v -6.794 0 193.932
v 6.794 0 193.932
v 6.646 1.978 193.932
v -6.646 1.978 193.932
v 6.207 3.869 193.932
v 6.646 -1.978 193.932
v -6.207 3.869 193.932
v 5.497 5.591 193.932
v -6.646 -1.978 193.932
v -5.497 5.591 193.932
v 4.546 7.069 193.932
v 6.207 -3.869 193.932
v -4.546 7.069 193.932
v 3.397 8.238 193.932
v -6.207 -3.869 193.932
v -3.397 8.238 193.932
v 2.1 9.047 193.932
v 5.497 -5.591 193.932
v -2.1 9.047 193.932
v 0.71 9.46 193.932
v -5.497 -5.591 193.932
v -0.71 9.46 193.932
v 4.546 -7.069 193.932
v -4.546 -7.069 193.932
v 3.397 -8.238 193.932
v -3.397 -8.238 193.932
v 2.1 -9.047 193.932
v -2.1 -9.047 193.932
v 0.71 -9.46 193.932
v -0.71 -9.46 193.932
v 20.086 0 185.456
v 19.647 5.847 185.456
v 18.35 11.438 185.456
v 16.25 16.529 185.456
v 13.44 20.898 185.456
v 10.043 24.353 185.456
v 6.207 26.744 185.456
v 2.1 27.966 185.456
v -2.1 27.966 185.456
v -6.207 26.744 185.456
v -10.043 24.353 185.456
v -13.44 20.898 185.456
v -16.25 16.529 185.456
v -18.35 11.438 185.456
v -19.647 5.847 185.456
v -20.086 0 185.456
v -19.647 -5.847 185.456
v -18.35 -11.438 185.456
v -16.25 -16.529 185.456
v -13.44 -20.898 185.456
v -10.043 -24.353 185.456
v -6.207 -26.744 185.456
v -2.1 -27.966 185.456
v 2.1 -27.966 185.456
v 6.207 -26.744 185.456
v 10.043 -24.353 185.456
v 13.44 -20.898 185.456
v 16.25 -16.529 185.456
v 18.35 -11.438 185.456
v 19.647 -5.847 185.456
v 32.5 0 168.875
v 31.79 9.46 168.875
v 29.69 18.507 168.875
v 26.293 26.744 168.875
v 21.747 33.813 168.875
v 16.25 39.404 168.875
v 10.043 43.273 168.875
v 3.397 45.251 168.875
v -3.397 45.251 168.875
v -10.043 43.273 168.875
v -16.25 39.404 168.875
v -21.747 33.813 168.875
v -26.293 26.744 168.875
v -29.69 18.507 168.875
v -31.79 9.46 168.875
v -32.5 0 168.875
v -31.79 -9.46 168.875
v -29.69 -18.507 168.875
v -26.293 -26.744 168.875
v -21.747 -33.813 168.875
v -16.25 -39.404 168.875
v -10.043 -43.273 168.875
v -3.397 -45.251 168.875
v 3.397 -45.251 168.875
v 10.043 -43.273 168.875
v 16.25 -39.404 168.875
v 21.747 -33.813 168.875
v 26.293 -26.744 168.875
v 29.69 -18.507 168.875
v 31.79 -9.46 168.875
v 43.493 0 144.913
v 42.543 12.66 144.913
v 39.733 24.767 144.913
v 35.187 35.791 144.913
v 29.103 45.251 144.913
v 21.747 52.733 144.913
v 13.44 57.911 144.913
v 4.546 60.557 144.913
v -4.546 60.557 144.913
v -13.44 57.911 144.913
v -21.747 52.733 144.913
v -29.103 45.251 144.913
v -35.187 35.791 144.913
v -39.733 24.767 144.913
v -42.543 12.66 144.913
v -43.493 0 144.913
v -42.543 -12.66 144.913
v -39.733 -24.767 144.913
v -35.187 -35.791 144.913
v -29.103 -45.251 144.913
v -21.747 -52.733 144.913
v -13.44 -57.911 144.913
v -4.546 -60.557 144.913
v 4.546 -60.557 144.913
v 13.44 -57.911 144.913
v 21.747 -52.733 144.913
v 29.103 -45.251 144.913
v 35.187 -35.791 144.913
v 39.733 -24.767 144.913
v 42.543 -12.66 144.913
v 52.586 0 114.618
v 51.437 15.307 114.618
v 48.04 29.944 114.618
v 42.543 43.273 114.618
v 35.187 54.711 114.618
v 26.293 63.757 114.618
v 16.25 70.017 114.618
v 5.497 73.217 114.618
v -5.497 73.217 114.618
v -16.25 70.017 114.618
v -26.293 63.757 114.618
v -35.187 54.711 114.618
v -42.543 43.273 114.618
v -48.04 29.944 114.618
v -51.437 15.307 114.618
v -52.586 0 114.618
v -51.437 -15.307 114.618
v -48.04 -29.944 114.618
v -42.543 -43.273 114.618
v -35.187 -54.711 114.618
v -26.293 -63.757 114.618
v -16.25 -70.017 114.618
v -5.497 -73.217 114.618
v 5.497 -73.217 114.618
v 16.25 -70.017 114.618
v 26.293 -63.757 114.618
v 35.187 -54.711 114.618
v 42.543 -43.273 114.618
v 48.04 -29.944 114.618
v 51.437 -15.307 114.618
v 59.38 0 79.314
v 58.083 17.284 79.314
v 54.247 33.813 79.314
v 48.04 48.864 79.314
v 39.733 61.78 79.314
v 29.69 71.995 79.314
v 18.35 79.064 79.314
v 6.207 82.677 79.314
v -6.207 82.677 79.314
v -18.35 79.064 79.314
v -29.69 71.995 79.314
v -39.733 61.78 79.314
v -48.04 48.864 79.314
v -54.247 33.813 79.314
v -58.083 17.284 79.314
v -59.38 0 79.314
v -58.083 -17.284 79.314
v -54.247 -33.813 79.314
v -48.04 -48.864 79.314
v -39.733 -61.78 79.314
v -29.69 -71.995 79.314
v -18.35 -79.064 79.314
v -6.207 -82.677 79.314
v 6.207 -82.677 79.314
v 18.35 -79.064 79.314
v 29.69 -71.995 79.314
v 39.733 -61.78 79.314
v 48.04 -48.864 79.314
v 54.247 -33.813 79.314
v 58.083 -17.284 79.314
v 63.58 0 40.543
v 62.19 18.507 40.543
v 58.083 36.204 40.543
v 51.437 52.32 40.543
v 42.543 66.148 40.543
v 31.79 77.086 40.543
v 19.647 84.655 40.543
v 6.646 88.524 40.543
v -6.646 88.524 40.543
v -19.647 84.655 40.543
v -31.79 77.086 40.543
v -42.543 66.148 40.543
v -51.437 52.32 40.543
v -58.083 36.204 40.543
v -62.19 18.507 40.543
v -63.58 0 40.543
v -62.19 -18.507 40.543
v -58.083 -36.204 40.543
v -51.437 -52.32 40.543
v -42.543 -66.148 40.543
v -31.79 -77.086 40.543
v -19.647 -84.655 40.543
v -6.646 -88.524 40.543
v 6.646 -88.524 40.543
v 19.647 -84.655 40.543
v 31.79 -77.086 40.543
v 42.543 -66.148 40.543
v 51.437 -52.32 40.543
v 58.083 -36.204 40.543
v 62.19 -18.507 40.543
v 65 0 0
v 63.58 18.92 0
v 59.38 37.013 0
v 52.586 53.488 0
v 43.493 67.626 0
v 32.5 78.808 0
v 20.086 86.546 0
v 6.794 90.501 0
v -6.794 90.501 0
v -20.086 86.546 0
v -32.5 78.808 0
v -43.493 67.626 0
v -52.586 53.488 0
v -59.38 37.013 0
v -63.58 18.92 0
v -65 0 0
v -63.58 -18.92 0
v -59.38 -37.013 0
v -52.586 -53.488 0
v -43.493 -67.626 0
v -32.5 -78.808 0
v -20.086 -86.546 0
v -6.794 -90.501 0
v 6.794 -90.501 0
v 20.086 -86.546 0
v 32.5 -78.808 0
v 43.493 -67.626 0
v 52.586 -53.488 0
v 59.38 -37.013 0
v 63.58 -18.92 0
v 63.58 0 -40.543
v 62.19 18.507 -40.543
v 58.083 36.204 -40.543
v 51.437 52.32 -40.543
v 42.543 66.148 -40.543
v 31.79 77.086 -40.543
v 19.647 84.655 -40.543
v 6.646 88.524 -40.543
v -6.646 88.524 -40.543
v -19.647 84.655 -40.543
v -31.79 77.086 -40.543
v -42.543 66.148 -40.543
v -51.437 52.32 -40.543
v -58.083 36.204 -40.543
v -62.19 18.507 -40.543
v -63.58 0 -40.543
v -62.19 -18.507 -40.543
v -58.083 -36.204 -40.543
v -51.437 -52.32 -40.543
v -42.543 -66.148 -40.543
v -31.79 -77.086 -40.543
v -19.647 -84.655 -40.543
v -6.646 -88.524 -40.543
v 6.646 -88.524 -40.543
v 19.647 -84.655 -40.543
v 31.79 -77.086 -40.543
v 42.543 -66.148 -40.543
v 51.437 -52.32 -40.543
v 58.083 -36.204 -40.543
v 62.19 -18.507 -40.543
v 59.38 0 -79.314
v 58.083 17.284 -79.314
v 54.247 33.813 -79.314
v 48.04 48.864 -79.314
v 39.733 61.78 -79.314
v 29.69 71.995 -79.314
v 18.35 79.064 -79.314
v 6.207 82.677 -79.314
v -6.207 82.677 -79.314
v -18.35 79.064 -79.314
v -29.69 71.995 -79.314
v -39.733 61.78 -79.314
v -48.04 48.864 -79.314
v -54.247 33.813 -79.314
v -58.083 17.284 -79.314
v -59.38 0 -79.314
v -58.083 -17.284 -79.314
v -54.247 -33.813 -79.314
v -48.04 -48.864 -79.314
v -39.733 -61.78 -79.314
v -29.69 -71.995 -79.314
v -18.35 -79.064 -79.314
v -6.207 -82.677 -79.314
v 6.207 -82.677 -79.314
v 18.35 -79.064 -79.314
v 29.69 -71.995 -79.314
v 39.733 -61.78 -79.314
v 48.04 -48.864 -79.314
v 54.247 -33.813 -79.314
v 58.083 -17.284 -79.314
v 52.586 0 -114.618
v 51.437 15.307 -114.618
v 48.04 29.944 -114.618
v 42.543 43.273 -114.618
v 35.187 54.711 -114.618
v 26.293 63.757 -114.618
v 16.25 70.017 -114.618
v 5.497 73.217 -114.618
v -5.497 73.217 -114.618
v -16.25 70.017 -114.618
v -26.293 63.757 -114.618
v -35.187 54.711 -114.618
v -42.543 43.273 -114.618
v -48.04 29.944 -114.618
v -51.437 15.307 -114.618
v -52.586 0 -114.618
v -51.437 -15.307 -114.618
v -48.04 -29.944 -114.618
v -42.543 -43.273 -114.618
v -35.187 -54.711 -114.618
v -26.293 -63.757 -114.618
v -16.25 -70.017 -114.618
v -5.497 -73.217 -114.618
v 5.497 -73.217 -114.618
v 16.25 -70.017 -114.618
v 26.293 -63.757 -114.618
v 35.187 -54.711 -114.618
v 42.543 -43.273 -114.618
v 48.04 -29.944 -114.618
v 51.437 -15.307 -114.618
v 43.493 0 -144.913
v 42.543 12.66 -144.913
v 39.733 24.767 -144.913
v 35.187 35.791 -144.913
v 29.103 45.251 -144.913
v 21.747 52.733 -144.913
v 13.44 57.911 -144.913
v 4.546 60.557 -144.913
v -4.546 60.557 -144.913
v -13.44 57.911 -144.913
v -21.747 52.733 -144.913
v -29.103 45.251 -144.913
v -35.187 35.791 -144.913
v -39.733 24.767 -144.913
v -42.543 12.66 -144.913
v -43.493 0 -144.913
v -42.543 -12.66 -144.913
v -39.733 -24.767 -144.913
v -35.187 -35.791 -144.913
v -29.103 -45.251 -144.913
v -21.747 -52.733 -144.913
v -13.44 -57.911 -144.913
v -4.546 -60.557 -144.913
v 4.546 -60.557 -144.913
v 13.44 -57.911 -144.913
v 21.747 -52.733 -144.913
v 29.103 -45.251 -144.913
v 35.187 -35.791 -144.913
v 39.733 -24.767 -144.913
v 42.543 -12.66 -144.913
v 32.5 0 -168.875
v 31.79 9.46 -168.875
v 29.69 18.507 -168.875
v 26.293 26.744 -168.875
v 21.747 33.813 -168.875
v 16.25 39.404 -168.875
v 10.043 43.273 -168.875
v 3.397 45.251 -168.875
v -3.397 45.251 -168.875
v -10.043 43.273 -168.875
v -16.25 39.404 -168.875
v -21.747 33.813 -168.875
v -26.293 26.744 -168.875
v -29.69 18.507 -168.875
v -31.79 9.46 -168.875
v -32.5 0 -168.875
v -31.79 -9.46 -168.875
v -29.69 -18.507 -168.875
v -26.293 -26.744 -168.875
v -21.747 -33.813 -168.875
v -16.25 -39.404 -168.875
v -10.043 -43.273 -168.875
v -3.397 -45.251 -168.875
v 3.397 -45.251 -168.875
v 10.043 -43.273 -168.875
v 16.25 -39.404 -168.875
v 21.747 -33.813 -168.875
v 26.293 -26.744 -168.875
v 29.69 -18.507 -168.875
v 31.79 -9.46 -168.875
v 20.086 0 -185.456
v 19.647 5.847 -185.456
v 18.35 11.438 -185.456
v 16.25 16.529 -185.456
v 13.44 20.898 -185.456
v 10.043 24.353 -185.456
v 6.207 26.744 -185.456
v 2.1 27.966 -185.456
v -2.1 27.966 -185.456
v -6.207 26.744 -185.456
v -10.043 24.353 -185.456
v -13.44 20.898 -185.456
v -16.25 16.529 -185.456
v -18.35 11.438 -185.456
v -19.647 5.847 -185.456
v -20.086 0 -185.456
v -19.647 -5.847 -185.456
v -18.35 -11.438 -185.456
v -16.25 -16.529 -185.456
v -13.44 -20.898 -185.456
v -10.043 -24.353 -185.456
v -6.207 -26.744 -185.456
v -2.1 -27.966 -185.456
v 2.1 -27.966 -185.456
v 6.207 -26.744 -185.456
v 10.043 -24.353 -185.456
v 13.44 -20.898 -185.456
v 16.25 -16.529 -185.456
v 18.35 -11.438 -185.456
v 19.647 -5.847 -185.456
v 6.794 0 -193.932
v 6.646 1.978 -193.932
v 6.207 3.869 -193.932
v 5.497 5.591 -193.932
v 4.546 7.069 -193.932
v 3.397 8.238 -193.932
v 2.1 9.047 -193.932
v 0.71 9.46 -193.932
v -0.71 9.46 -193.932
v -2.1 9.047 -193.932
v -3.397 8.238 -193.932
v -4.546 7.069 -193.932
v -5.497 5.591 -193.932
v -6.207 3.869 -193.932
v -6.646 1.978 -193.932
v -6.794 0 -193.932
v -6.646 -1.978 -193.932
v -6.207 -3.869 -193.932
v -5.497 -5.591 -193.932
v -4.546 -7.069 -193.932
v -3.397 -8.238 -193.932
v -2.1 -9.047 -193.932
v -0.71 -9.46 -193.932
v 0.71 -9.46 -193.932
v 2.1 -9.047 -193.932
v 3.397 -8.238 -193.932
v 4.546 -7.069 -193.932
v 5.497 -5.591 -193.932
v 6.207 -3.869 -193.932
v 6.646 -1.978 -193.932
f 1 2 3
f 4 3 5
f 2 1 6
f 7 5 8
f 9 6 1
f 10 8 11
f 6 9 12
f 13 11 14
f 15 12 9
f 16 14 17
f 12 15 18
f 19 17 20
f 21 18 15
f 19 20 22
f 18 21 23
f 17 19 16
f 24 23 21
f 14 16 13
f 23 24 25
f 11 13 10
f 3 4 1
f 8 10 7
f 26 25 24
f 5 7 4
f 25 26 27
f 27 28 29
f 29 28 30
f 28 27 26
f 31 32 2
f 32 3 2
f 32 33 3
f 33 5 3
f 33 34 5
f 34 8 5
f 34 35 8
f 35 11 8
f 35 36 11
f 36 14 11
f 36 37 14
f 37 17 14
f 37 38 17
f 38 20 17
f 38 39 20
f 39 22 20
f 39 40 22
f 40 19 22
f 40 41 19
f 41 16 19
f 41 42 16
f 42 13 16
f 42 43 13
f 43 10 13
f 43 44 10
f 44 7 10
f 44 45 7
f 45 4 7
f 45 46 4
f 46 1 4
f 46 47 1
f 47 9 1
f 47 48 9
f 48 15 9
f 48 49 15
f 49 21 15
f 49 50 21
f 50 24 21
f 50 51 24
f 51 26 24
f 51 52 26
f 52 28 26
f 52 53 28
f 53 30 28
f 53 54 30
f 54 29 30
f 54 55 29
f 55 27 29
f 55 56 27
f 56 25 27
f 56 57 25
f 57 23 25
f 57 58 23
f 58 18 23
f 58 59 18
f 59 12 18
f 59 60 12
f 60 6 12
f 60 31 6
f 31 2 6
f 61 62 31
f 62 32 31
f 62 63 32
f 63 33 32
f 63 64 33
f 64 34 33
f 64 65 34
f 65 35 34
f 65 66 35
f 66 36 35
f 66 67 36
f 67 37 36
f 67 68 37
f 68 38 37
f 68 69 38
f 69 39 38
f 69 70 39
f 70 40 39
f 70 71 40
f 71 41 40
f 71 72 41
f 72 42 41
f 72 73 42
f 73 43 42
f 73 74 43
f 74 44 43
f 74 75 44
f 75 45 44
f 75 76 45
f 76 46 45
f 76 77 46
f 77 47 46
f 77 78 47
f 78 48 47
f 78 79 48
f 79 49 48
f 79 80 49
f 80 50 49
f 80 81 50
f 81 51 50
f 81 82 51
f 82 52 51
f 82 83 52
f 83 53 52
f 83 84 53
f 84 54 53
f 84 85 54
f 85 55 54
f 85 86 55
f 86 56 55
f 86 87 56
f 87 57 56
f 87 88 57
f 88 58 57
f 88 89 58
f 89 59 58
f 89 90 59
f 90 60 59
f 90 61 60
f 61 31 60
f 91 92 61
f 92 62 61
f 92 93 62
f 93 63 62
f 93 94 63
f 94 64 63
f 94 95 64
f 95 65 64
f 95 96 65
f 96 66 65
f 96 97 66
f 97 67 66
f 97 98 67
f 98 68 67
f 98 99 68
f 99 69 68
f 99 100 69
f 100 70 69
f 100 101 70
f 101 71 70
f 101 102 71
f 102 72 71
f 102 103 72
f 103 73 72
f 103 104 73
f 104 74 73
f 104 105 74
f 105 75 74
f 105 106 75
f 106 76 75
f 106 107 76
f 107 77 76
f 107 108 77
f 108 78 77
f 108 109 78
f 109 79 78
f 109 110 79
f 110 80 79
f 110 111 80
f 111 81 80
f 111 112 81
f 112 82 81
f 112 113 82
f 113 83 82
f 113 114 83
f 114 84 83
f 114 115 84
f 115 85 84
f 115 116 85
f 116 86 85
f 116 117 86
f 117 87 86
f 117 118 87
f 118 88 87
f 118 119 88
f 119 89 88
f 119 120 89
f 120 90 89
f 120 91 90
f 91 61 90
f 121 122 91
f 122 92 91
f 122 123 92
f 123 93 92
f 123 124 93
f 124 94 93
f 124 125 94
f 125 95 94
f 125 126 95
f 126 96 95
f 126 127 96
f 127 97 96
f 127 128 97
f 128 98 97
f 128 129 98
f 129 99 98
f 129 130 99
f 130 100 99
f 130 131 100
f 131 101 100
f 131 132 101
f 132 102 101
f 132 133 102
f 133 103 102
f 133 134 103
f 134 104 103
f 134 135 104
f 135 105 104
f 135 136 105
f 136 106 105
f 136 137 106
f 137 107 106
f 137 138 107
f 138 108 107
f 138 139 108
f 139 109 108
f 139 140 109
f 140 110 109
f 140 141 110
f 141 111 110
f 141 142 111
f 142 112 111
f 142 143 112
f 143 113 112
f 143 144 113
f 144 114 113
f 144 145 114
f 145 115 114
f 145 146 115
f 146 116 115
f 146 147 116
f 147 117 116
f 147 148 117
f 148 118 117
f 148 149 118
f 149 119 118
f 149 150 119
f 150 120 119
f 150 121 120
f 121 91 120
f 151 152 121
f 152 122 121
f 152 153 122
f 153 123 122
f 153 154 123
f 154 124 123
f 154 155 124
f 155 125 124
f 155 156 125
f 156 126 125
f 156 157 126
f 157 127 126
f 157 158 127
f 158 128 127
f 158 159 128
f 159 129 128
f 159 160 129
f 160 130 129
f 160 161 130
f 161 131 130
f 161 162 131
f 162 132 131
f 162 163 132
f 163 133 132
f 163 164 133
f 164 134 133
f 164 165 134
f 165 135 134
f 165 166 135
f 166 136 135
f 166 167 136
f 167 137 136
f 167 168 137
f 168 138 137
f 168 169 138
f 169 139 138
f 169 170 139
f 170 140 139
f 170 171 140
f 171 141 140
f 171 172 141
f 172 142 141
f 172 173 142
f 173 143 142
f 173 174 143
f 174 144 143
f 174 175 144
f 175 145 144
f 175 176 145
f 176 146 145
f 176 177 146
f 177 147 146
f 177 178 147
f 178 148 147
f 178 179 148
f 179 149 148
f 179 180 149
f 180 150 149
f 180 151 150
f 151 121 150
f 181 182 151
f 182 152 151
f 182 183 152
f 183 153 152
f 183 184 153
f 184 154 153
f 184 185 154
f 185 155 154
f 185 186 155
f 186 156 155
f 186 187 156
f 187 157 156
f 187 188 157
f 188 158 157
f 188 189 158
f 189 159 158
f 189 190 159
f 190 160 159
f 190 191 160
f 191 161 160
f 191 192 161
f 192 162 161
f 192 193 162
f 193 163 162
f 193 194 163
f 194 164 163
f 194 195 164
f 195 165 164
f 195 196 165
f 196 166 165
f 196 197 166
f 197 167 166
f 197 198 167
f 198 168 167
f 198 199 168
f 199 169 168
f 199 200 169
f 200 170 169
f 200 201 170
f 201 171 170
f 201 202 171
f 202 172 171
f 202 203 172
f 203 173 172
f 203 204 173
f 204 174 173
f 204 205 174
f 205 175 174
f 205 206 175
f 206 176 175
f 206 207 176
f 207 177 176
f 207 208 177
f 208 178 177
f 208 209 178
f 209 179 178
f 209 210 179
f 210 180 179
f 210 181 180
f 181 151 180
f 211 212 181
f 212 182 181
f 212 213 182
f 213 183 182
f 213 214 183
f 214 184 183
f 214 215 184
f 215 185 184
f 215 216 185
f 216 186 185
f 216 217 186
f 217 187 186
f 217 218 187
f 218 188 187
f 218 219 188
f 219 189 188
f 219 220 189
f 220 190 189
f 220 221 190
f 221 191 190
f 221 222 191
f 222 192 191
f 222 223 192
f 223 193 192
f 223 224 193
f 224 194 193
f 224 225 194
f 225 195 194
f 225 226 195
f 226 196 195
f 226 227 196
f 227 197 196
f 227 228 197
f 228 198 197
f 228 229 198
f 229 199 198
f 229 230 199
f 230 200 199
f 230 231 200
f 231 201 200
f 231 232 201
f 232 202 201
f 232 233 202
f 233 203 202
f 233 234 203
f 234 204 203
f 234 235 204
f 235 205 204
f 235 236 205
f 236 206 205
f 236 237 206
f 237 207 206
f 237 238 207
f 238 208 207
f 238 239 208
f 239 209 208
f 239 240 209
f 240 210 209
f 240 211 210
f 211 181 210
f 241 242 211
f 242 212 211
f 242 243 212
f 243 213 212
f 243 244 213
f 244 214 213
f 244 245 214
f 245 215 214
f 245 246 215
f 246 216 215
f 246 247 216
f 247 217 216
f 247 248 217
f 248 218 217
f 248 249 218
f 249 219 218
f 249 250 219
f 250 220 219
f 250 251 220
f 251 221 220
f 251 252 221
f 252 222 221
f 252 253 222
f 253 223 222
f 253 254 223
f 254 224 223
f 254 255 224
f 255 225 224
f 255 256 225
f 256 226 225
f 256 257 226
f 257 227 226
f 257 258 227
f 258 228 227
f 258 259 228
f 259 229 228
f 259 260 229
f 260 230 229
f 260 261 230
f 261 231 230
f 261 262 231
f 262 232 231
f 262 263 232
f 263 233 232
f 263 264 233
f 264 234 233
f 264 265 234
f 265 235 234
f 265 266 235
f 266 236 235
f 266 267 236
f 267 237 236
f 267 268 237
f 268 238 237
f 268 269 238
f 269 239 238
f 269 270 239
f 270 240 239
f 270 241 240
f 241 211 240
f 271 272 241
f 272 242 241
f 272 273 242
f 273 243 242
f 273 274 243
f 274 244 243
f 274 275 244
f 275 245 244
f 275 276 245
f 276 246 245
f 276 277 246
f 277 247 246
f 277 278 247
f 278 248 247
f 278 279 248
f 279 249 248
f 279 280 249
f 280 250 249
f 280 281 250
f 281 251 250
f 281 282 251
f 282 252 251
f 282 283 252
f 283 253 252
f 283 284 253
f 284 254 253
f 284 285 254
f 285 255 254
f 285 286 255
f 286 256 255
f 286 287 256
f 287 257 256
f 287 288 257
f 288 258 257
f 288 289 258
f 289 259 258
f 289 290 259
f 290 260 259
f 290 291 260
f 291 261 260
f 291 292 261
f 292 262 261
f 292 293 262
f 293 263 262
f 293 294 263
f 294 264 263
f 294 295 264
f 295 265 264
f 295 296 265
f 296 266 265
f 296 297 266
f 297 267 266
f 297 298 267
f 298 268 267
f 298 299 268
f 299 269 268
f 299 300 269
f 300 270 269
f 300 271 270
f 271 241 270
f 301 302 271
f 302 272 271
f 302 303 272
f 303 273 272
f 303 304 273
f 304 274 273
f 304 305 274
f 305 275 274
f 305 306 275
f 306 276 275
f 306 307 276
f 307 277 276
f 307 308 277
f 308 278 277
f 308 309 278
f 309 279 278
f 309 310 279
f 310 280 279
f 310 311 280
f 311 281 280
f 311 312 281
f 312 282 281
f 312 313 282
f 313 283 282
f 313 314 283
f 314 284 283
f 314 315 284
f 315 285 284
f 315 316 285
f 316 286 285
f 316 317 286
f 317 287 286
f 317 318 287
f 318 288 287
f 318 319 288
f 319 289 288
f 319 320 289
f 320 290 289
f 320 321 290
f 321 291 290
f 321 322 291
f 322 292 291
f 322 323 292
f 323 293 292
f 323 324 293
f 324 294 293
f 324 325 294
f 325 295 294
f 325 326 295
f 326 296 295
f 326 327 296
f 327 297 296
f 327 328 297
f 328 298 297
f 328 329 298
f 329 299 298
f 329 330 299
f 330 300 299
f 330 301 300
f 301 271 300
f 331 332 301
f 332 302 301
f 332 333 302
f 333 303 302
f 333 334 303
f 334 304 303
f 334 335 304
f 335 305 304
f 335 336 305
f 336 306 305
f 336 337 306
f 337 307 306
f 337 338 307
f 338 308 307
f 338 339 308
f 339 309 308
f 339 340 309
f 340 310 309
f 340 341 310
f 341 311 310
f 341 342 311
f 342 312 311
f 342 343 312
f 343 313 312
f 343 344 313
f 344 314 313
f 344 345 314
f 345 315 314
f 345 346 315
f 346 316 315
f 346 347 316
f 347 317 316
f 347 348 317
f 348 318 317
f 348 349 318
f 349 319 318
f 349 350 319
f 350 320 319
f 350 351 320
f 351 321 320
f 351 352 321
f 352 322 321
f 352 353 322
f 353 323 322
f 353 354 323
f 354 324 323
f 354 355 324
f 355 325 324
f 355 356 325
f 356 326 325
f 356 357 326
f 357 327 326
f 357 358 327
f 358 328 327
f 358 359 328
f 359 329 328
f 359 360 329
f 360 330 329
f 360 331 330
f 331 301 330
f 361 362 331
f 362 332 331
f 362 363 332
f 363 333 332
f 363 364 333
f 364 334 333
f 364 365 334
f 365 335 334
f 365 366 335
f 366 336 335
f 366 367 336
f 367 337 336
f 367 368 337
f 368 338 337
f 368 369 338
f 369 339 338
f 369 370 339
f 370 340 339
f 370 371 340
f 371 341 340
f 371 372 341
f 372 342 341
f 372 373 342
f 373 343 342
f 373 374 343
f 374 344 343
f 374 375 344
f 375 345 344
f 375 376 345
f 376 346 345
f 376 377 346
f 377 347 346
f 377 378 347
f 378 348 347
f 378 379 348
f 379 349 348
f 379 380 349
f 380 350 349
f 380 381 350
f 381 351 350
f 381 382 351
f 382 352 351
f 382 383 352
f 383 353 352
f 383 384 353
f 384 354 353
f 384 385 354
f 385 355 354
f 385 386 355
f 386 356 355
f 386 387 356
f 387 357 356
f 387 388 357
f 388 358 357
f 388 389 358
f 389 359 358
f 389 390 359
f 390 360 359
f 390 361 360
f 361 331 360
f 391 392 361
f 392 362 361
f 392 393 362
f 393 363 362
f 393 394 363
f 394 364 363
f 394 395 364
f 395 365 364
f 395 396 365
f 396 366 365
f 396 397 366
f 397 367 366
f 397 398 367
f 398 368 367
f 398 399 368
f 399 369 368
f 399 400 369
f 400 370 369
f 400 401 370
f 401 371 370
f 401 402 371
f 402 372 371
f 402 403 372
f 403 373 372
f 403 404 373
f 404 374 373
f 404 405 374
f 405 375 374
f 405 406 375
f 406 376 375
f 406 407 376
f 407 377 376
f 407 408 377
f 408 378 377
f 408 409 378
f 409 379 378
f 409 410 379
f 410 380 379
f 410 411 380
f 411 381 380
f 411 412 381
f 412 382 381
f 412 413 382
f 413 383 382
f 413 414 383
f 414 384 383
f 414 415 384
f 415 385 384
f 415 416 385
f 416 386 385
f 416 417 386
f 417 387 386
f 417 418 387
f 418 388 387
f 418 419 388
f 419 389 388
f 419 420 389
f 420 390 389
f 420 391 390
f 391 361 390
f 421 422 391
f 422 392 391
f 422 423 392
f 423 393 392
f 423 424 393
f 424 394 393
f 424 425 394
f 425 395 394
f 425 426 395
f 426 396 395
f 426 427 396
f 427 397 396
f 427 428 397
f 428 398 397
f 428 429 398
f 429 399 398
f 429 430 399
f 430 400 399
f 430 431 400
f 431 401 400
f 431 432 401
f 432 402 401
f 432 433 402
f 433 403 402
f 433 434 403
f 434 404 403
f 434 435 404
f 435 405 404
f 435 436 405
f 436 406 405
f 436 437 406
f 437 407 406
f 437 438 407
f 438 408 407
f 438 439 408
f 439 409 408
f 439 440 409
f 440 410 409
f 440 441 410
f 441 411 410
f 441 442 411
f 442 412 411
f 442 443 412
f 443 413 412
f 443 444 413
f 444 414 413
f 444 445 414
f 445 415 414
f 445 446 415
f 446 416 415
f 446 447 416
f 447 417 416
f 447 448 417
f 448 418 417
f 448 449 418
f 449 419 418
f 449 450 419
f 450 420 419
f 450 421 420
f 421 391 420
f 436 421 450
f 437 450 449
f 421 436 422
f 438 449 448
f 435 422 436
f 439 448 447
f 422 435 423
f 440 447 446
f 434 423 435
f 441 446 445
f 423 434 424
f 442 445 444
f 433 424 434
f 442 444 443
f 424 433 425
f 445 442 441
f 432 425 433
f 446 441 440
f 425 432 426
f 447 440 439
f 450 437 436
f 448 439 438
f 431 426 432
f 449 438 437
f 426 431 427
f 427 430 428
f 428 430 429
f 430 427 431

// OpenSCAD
// Generated by SolidPython 1.0.1 on 2020-07-29 00:46:46


scale(v = [5, 7, 15]) {
	sphere(r = 13);
}
/***********************************************
*********      SolidPython code:      **********
************************************************
 
# import packages: SolidPython
from solid import *
from solid.utils import *
from itertools import chain, combinations, permutations


class Resize:

    def __init__(self, scad_file):
        self.scad_file = scad_file
        #self.scad_file = import_scad(scad_file)
        # cone/cylinder param:
        self.r1 = 0
        self.r2 = 0
        self.h = 0
        # rectangular prism param:
        self.w = 0
        self.l = 0
        # ellipse param:
        self.r = 0

    # import OpenScad code (file name corresponds to shape)


    # classify shape + parameters
    def assign(self, param1, param2, param3):
        if self.scad_file == 'cone.scad':
            self.r1 = param1
            self.r2 = param2
            self.h = param3
        elif self.scad_file == 'cylinder.scad':
            self.r1 = param1
            self.r2 = param2
            self.h = param3
        elif self.scad_file == 'rectangularPrism.scad':
            self.h = param1
            self.l = param2
            self.w = param3
        else:
            self.r = param1
            self.h = param2

    # resize parameters
    def iterate(self):
        x = range(3, 20, 2)
        i = 1
        if self.scad_file == 'cone.scad':
            tempList = list(permutations(x, 2))
            for temp in tempList:
                param1 = temp[0]
                param2 = temp[1]
                filepath = 'produced_scad_files/' + 'cone' + str(param1) + '_' + str(param2) + '_' + '.scad'
                scad_render_to_file(cylinder(h=param1, r1=param2, r2=0), filepath)

        elif self.scad_file == 'cylinder.scad':
            tempList = list(permutations(x, 3))
            for temp in tempList:
                param1 = temp[0]
                param2 = temp[1]
                filepath = 'produced_scad_files/' + 'cylinder' + str(param1) + '_' + str(param2) + '_' + '.scad'
                scad_render_to_file(cylinder(h=param1, r1=param2, r2=param2), filepath)

        elif self.scad_file == 'rectangularPrism.scad':
            tempList = list(permutations(x, 3))
            for temp in tempList:
                param1 = temp[0]
                param2 = temp[1]
                param3 = temp[2]
                filepath = 'produced_scad_files/' + 'rectangularPrism' + str(param1) + '_' + str(param2) + '_' + str(
                    param3) + '.scad'
                scad_render_to_file(cube(size=(param1, param2, param3)), filepath)

        elif self.scad_file == 'ellipse.scad':
            tempList = list(permutations(x, 4))
            for temp in tempList:
                param1 = temp[0]
                param2 = temp[1]
                param3 = temp[2]
                param4 = temp[3]
                filepath = 'produced_scad_files/' + 'ellipse' + str(param1) + '_' + str(param2) + '_' + str(param3) + '_' + str(param4) + '.scad'
                scad_render_to_file(scale([param1, param2, param3])(sphere(r=param4)), filepath)

    def render_to_scadfile(self):
        scad_render_to_file(scad, 'example.scad') 
 
************************************************/
